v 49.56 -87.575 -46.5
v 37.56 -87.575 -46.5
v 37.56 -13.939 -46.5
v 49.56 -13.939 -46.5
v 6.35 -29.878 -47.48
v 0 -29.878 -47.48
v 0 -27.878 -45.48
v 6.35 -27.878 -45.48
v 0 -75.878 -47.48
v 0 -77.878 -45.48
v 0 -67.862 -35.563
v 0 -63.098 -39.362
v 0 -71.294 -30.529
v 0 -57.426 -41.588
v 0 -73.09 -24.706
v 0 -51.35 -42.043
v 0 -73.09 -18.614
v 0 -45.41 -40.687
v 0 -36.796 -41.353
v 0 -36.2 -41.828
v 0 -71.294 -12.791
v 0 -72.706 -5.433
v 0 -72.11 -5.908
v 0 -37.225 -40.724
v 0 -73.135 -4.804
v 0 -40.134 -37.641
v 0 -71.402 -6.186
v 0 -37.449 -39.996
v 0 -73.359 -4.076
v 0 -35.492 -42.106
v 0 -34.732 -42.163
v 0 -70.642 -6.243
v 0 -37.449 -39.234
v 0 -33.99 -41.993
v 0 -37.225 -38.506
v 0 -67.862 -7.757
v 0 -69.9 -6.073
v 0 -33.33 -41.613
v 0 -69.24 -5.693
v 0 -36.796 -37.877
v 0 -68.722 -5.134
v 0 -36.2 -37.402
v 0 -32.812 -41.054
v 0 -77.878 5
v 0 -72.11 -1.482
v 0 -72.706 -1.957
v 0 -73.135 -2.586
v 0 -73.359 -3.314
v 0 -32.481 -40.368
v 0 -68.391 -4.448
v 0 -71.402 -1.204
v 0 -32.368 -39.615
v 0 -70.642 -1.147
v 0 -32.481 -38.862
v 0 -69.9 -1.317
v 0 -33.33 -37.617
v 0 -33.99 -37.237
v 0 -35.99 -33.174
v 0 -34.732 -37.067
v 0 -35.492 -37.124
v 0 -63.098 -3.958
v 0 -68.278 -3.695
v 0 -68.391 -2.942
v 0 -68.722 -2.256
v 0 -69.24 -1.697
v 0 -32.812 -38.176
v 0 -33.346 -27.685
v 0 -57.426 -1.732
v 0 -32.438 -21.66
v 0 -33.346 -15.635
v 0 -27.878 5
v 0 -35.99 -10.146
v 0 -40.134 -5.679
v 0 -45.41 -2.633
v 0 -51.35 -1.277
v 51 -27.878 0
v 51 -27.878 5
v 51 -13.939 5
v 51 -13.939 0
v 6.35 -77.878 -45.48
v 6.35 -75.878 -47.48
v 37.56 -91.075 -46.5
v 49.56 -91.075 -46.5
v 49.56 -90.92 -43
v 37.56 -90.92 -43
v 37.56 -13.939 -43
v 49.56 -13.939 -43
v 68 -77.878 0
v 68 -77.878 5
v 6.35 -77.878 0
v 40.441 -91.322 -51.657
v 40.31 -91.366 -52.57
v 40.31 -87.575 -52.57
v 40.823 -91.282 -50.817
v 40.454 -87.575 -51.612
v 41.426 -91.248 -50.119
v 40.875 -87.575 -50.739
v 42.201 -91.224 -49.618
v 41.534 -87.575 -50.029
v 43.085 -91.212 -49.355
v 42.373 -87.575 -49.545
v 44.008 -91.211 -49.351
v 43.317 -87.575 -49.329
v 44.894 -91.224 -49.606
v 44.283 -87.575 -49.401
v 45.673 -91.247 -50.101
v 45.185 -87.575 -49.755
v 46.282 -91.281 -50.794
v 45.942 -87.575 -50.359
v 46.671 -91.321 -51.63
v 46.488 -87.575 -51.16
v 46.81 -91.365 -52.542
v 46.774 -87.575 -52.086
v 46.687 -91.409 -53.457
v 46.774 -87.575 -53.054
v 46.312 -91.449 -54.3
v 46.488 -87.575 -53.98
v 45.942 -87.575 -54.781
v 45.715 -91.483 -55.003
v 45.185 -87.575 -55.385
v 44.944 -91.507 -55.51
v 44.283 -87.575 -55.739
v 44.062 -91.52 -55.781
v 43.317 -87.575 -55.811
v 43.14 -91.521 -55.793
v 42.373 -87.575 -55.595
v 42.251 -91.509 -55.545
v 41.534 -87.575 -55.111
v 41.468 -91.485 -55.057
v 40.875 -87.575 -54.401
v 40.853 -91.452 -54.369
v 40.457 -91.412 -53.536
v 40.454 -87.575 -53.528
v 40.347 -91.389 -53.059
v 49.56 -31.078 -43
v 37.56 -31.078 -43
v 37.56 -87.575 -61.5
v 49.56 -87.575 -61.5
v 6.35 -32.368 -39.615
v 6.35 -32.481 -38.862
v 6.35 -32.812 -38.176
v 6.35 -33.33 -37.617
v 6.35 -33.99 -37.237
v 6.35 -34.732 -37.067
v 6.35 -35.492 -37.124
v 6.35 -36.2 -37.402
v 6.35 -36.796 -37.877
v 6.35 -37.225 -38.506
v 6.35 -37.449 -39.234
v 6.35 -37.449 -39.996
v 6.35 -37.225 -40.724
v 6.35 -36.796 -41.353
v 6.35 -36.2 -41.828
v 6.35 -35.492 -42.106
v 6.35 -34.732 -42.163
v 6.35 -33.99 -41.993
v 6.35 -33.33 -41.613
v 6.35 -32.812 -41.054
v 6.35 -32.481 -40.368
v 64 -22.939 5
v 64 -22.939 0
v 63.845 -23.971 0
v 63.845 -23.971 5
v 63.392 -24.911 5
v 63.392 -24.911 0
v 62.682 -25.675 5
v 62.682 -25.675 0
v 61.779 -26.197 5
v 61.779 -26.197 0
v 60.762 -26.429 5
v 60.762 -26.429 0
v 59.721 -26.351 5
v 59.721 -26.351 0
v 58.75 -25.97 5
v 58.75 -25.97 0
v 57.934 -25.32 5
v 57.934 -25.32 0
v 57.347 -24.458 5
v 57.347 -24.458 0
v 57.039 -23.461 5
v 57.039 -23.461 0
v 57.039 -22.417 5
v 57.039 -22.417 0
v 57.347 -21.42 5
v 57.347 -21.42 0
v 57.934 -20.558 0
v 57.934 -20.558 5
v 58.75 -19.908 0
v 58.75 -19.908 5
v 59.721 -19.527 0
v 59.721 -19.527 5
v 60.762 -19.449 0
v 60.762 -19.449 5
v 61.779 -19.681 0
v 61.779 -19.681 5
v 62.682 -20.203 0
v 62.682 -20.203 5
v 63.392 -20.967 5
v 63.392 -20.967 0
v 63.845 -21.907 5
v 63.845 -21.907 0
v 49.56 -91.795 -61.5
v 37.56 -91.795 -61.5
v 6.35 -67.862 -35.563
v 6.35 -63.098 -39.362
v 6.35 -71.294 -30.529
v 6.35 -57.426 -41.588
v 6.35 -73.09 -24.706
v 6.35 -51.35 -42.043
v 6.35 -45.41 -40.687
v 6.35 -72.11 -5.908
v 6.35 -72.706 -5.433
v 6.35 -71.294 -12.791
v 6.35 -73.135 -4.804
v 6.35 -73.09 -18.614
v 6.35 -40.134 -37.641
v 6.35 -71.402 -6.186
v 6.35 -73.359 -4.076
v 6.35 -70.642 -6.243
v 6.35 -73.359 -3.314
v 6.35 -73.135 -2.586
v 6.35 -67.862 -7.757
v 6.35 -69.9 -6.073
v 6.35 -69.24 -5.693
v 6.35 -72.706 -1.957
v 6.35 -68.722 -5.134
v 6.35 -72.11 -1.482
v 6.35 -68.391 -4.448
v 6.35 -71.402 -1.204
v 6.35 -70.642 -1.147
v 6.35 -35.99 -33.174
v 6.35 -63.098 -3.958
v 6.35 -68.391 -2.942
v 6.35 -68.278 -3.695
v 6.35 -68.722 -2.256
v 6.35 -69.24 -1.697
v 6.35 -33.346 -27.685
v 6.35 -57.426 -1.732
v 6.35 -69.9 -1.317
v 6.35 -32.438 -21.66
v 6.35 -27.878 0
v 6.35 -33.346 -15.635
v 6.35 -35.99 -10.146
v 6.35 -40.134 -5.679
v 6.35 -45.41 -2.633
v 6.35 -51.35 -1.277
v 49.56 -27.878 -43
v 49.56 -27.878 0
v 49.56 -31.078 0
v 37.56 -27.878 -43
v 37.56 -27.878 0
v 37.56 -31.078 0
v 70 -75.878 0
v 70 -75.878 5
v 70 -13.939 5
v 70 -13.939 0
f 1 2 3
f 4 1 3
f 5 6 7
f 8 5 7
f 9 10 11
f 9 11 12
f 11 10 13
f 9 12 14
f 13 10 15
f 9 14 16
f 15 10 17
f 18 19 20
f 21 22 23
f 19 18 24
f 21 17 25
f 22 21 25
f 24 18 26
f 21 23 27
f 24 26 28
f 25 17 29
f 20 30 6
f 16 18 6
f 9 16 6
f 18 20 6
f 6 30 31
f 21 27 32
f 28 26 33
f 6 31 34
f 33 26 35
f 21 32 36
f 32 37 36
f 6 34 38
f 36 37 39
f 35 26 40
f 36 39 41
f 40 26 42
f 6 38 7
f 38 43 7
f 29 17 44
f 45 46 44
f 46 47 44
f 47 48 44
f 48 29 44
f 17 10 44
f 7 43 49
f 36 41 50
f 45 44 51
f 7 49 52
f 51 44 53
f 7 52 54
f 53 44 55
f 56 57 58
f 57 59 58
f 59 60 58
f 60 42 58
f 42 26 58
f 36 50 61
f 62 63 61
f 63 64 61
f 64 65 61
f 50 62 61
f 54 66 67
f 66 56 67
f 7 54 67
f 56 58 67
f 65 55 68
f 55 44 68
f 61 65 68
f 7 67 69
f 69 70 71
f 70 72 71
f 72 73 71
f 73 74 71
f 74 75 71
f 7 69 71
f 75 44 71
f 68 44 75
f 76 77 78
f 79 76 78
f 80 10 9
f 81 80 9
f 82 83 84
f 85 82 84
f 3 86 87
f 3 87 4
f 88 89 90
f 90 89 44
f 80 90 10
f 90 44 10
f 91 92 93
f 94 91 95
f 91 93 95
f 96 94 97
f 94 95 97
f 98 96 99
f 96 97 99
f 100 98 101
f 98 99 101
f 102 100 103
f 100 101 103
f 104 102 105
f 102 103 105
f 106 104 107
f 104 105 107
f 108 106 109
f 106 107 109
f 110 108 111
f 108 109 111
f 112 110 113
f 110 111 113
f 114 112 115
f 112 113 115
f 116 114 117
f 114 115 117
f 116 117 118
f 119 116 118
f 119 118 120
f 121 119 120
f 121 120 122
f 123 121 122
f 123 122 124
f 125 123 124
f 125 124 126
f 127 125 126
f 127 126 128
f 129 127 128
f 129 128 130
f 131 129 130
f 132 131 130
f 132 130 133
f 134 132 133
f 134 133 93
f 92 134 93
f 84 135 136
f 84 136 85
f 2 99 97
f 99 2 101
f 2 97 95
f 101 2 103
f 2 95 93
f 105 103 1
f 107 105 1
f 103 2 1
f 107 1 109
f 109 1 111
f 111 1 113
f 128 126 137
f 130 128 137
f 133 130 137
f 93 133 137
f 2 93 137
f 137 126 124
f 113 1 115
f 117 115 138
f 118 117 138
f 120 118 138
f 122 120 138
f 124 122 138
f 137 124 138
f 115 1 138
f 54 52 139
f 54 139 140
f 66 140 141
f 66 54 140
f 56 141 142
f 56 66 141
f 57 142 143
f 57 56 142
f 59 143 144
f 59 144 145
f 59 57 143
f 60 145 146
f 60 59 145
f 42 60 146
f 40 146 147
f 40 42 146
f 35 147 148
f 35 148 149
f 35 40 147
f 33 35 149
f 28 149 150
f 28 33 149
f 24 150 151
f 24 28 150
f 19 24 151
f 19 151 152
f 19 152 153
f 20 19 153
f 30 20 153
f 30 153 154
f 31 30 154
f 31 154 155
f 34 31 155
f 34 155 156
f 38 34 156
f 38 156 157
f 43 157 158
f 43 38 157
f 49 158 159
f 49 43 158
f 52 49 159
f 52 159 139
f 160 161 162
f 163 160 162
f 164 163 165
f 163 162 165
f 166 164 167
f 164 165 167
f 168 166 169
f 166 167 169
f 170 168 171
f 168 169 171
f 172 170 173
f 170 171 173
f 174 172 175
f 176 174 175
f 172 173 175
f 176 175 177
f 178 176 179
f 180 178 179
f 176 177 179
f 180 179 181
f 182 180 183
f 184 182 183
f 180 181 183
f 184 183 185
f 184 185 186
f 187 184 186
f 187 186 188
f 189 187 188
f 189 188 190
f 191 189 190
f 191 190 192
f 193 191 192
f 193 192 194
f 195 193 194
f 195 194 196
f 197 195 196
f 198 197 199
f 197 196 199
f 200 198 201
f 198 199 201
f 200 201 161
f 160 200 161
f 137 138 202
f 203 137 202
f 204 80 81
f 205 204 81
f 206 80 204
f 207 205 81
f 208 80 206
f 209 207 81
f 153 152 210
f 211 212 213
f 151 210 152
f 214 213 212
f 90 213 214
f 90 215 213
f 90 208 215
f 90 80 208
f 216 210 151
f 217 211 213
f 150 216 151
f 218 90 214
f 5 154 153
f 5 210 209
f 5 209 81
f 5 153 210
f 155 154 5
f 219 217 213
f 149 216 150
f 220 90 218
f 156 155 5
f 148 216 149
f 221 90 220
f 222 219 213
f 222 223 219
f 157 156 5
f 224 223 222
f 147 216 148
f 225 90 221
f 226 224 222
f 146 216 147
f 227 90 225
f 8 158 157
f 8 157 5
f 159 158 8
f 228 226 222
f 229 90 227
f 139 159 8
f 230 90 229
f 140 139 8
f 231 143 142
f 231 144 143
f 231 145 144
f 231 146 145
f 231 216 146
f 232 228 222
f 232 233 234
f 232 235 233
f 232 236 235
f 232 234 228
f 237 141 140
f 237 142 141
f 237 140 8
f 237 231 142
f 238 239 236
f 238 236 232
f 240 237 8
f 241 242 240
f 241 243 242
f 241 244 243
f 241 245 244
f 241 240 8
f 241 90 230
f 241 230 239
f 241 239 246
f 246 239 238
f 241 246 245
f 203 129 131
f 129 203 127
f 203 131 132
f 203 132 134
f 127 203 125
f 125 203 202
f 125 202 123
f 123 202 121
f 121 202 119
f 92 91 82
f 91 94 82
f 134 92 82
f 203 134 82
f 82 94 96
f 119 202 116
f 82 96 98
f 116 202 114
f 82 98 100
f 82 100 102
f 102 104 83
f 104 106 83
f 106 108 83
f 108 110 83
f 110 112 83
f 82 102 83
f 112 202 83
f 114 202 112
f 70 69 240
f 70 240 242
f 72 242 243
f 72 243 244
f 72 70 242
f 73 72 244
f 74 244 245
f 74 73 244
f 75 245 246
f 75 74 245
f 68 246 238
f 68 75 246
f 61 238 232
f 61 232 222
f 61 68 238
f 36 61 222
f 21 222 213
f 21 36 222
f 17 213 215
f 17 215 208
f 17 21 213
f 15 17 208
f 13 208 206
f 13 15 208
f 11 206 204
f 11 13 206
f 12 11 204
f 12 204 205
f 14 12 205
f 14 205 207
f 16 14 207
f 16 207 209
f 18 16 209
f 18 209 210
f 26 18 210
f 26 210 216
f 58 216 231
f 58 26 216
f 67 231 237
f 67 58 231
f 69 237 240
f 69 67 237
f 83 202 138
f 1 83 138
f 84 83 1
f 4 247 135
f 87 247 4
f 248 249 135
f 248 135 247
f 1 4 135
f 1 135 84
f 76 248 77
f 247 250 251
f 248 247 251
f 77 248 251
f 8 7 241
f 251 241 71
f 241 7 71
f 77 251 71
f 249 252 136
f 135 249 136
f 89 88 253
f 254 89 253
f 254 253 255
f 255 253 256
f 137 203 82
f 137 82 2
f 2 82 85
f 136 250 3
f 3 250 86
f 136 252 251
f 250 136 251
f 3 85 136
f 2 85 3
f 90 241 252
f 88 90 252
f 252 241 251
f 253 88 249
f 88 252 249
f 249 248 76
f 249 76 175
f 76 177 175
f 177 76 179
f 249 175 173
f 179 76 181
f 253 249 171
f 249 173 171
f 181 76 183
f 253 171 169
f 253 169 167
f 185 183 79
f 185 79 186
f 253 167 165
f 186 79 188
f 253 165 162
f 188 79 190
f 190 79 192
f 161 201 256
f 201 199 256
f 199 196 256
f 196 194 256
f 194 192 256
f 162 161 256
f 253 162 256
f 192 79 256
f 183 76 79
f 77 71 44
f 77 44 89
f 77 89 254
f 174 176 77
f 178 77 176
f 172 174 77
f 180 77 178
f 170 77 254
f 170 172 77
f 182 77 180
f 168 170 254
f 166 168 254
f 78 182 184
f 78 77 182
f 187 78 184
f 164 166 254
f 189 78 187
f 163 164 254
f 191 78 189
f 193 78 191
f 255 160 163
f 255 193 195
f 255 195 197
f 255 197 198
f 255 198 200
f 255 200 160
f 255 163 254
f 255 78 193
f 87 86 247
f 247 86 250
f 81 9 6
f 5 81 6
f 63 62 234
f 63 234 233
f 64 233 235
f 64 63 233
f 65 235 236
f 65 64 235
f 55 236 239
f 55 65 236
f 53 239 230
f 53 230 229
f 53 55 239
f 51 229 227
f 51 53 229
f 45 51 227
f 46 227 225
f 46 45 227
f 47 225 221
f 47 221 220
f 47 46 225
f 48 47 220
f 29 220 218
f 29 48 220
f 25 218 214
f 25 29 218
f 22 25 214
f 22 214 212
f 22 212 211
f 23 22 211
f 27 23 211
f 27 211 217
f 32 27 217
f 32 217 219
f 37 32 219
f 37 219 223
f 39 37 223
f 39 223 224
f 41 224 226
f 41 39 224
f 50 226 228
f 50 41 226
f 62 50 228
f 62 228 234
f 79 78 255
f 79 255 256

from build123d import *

# Parameters (mm, degrees)
BOSS_EXTRUDE1_DEPTH   = 5
SKETCH2_W             = 6.35
SKETCH2_H             = 50
BOSS_EXTRUDE2_DEPTH   = 52.48
CUT_EXTRUDE1_REACH    = 106.448
SKETCH3_R             = 20.44
SKETCH3_R_2           = 2.555
SKETCH3_W             = 5
SKETCH3_H             = 50
CUT_EXTRUDE2_REACH    = 108.104
SKETCH4_R             = 3.5
CUT_EXTRUDE6_REACH    = 108.104
SKETCH14_W            = 23.196263878
SKETCH14_H            = 15.316152196
SKETCH15_W            = 12
SKETCH15_H            = 3.2
BOSS_EXTRUDE7_DEPTH   = 46.5
BOSS_EXTRUDE8_REACH   = 98.667
SKETCH16_W            = 12
SKETCH16_H            = 3.5
SKETCH17_W            = 12
SKETCH17_H            = 3.5
BOSS_EXTRUDE9_DEPTH   = 15
CHAMFER2_SIZE         = 2
SKETCH22_W            = 12
SKETCH22_H            = 15
BOSS_EXTRUDE10_DEPTH  = 0.72
CUT_EXTRUDE8_REACH    = 103.606
CUT_EXTRUDE7_REACH    = 120.762
SKETCH18_R            = 3.25
MIRROR2_OUTLINE_W     = 50
MIRROR2_OUTLINE_H     = 5
MIRROR2_DEPTH         = 68
MIRROR2_2_OUTLINE_R   = 2.555
MIRROR2_2_OUTLINE_R_2 = 20.44
MIRROR2_2_DEPTH       = 6.35
MIRROR2_START         = 37.56
MIRROR2_3_DEPTH       = 12
MIRROR2_START_2       = 51
MIRROR2_4_OUTLINE_W   = 13.938985111
MIRROR2_4_OUTLINE_H   = 5
MIRROR2_4_DEPTH       = 5.9999999
MIRROR2_START_3       = 64.0000001
MIRROR2_5_OUTLINE_W   = 13.938985111
MIRROR2_5_OUTLINE_H   = 5
MIRROR2_5_DEPTH       = 5.9999999
MIRROR2_6_DEPTH       = 5
BOSS_EXTRUDE11_DEPTH  = 12
CUT_EXTRUDE9_REACH    = 132.799
SKETCH26_W            = 121.241742099
SKETCH26_H            = 103.992632166
SKETCH27_R            = 3.25
CUT_EXTRUDE10_DEPTH   = 119.762181294


with BuildPart() as part:
    # Sketch1 → Boss-Extrude1 (new body)
    with BuildSketch(Plane.XY):
        Polygon((0, 0), (0, 50), (51, 50), (51, 64.061014889), (70, 64.061014889), (70, -13.938985111), (51, -13.938985111), (51, 0), align=None)
    extrude(amount=BOSS_EXTRUDE1_DEPTH)

    # Sketch2 → Boss-Extrude2 (add)
    with BuildSketch(Plane(origin=(0, 0, 0), x_dir=(-1, 0, 0), z_dir=(0, 0, -1))):
        with Locations((-3.175, 25)):
            Rectangle(SKETCH2_W, SKETCH2_H)
    extrude(amount=BOSS_EXTRUDE2_DEPTH)

    # Sketch3 → Cut-Extrude1 (cut, up to next)
    with BuildSketch(Plane(origin=(6.35, 0, 0), x_dir=(0, 0, -1), z_dir=(1, 0, 0)), mode=Mode.PRIVATE) as cut_extrude1_sk1:
        with Locations((21.66, 25)):
            Circle(SKETCH3_R)
    cut_extrude1_tool1 = extrude(cut_extrude1_sk1.sketch, amount=-CUT_EXTRUDE1_REACH, mode=Mode.PRIVATE) & part.part
    # Sketch3 → Cut-Extrude1 (cut, up to next)
    with BuildSketch(Plane(origin=(6.35, 0, 0), x_dir=(0, 0, -1), z_dir=(1, 0, 0)), mode=Mode.PRIVATE) as cut_extrude1_sk2:
        with Locations((3.695, 42.955)):
            Circle(SKETCH3_R_2)
    cut_extrude1_tool2 = extrude(cut_extrude1_sk2.sketch, amount=-CUT_EXTRUDE1_REACH, mode=Mode.PRIVATE) & part.part
    # Sketch3 → Cut-Extrude1 (cut, up to next)
    with BuildSketch(Plane(origin=(6.35, 0, 0), x_dir=(0, 0, -1), z_dir=(1, 0, 0)), mode=Mode.PRIVATE) as cut_extrude1_sk3:
        with Locations((39.615, 7.045)):
            Circle(SKETCH3_R_2)
    cut_extrude1_tool3 = extrude(cut_extrude1_sk3.sketch, amount=-CUT_EXTRUDE1_REACH, mode=Mode.PRIVATE) & part.part
    # Sketch3 → Cut-Extrude1 (cut, up to next)
    with BuildSketch(Plane(origin=(6.35, 0, 0), x_dir=(0, 0, -1), z_dir=(1, 0, 0)), mode=Mode.PRIVATE) as cut_extrude1_sk4:
        with Locations((49.98, 25)):
            Rectangle(SKETCH3_W, SKETCH3_H)
    cut_extrude1_tool4 = extrude(cut_extrude1_sk4.sketch, amount=-CUT_EXTRUDE1_REACH, mode=Mode.PRIVATE) & part.part
    add(cut_extrude1_tool1.solids().sort_by_distance((6.35, 25, -21.66))[0], mode=Mode.SUBTRACT)
    add(cut_extrude1_tool2.solids().sort_by_distance((6.35, 42.955, -3.695))[0], mode=Mode.SUBTRACT)
    add(cut_extrude1_tool3.solids().sort_by_distance((6.35, 7.045, -39.615))[0], mode=Mode.SUBTRACT)
    add(cut_extrude1_tool4.solids().sort_by_distance((6.35, 25, -49.98))[0], mode=Mode.SUBTRACT)

    # Sketch4 → Cut-Extrude2 (cut, up to next)
    with BuildSketch(Plane(origin=(0, 0, 0), x_dir=(-1, 0, 0), z_dir=(0, 0, -1)), mode=Mode.PRIVATE) as cut_extrude2_sk1:
        with Locations((-60.5, 55.061014889)):
            Circle(SKETCH4_R)
    cut_extrude2_tool1 = extrude(cut_extrude2_sk1.sketch, amount=-CUT_EXTRUDE2_REACH, mode=Mode.PRIVATE) & part.part
    # Sketch4 → Cut-Extrude2 (cut, up to next)
    with BuildSketch(Plane(origin=(0, 0, 0), x_dir=(-1, 0, 0), z_dir=(0, 0, -1)), mode=Mode.PRIVATE) as cut_extrude2_sk2:
        with Locations((-60.5, -4.938985111)):
            Circle(SKETCH4_R)
    cut_extrude2_tool2 = extrude(cut_extrude2_sk2.sketch, amount=-CUT_EXTRUDE2_REACH, mode=Mode.PRIVATE) & part.part
    add(cut_extrude2_tool1.solids().sort_by_distance((60.5, 55.061015, 0))[0], mode=Mode.SUBTRACT)
    add(cut_extrude2_tool2.solids().sort_by_distance((60.5, -4.938985, 0))[0], mode=Mode.SUBTRACT)

    # Sketch14 → Cut-Extrude6 (cut, up to next)
    with BuildSketch(Plane(origin=(0, 0, 0), x_dir=(-1, 0, 0), z_dir=(0, 0, -1)), mode=Mode.PRIVATE) as cut_extrude6_sk1:
        with Locations((-62.598131939, 57.658076098)):
            Rectangle(SKETCH14_W, SKETCH14_H)
    cut_extrude6_tool1 = extrude(cut_extrude6_sk1.sketch, amount=-CUT_EXTRUDE6_REACH, mode=Mode.PRIVATE) & part.part
    add(cut_extrude6_tool1.solids().sort_by_distance((62.598132, 57.658076, 0))[0], mode=Mode.SUBTRACT)

    # Sketch15 → Boss-Extrude7 (add)
    with BuildSketch(Plane(origin=(0, 0, 0), x_dir=(-1, 0, 0), z_dir=(0, 0, -1))):
        with Locations((-43.56, 1.6)):
            Rectangle(SKETCH15_W, SKETCH15_H)
    extrude(amount=BOSS_EXTRUDE7_DEPTH)

    # Boss-Extrude8: up to this plane
    boss_extrude8_end = Plane(origin=(166.832994776, 64.085435133, -66.619565524), z_dir=(-1.1416993347548052e-15, 0.9990256874715413, 0.04413247978546202))
    # Sketch16 → Boss-Extrude8 (add, up to the surface)
    with BuildSketch(Plane(origin=(0, 3.2, 0), x_dir=(1, 0, 0), z_dir=(0, 1, 0)), mode=Mode.PRIVATE) as boss_extrude8_sk1:
        with Locations((43.56, 44.75)):
            Rectangle(SKETCH16_W, SKETCH16_H)
    boss_extrude8_tool1 = split(extrude(boss_extrude8_sk1.sketch, amount=BOSS_EXTRUDE8_REACH, mode=Mode.PRIVATE), bisect_by=boss_extrude8_end, keep=Keep.BOTH, mode=Mode.PRIVATE)
    add(boss_extrude8_tool1.solids().sort_by_distance((43.56, 3.2, -44.75))[0])

    # Sketch17 → Boss-Extrude9 (add)
    with BuildSketch(Plane(origin=(0, 0, -46.5), x_dir=(-1, 0, 0), z_dir=(0, 0, -1))):
        with Locations((-43.56, 61.446642853)):
            Rectangle(SKETCH17_W, SKETCH17_H)
    extrude(amount=BOSS_EXTRUDE9_DEPTH)

    # Chamfer2
    chamfer2_edges = [part.edges().sort_by_distance(p)[0] for p in [
        (3.175, 0, -47.48),
        (3.175, 50, -47.48),
        (70, 50, 2.5),
    ]]
    chamfer(chamfer2_edges, length=CHAMFER2_SIZE)

    # Sketch22 → Boss-Extrude10 (add)
    with BuildSketch(Plane(origin=(0, 63.196642853, 0), x_dir=(1, 0, 0), z_dir=(0, 1, 0))):
        with Locations((43.56, 54)):
            Rectangle(SKETCH22_W, SKETCH22_H)
    extrude(amount=BOSS_EXTRUDE10_DEPTH)

    # Sketch23 → Cut-Extrude8 (cut, up to next)
    with BuildSketch(Plane(origin=(49.56, 0, 0), x_dir=(0, 0, -1), z_dir=(1, 0, 0)), mode=Mode.PRIVATE) as cut_extrude8_sk1:
        Polygon((46.5, 63.916642853), (46.5, 63.196642853), (61.5, 63.916642853), align=None)
    cut_extrude8_tool1 = extrude(cut_extrude8_sk1.sketch, amount=-CUT_EXTRUDE8_REACH, mode=Mode.PRIVATE) & part.part
    add(cut_extrude8_tool1.solids().sort_by_distance((49.56, 63.676643, -51.5))[0], mode=Mode.SUBTRACT)

    # Cut-Extrude7: up to this plane
    cut_extrude7_end = Plane(origin=(-0.001, 63.196642853, -46.5), z_dir=(-2.1659106514416256e-15, -0.9988499868416298, -0.04794479936839813))
    # Sketch18 → Cut-Extrude7 (cut, up to the surface)
    with BuildSketch(Plane.XZ.offset(-59.696642853), mode=Mode.PRIVATE) as cut_extrude7_sk1:
        with Locations(Location((43.56, -52.57, 0), (0, 0, 270))):
            Circle(SKETCH18_R)
    cut_extrude7_tool1 = split(extrude(cut_extrude7_sk1.sketch, amount=-CUT_EXTRUDE7_REACH, mode=Mode.PRIVATE), bisect_by=cut_extrude7_end, keep=Keep.BOTH, mode=Mode.PRIVATE)
    add(cut_extrude7_tool1.solids().sort_by_distance((43.56, 59.696643, -52.57))[0], mode=Mode.SUBTRACT)



with BuildPart() as body_2:
    # Mirror2: read off the stored shape, not the designer's step
    # Mirror2 outline → Mirror2 (new body)
    with BuildSketch(Plane.YZ):
        with Locations((-52.877970222, 2.5)):
            Rectangle(MIRROR2_OUTLINE_W, MIRROR2_OUTLINE_H)
    extrude(amount=MIRROR2_DEPTH)

    # Mirror2 2 outline → Mirror2 2 (add)
    with BuildSketch(Plane.YZ):
        Polygon((-27.877970222, -45.48), (-27.877970222, 0), (-77.877970222, 0), (-77.877970222, -45.48), (-75.877970222, -47.48), (-29.877970222, -47.48), align=None)
        with Locations((-34.922970222, -39.615)):
            Circle(MIRROR2_2_OUTLINE_R, mode=Mode.SUBTRACT)
        with Locations((-70.832970222, -3.695)):
            Circle(MIRROR2_2_OUTLINE_R, mode=Mode.SUBTRACT)
        with Locations((-52.877970222, -21.66)):
            Circle(MIRROR2_2_OUTLINE_R_2, mode=Mode.SUBTRACT)
    extrude(amount=MIRROR2_2_DEPTH)


with BuildPart() as part_1:
    add(part.part)

    add(body_2.part)  # Mirror2 3 merges body 2
    # Mirror2 3 outline → Mirror2 3 (add)
    with BuildSketch(Plane.YZ.offset(MIRROR2_START)):
        Polygon((-31.077970222, -46.5), (0, -46.5), (0, -43), (-27.877970222, -43), (-27.877970222, 0), (-31.077970222, 0), align=None)
    extrude(amount=MIRROR2_3_DEPTH)

    # Mirror2 4 outline → Mirror2 4 (add)
    with BuildSketch(Plane.YZ.offset(MIRROR2_START_2)):
        with Locations((-20.908477667, 2.5)):
            Rectangle(MIRROR2_4_OUTLINE_W, MIRROR2_4_OUTLINE_H)
    extrude(amount=MIRROR2_4_DEPTH)

    # Mirror2 5 outline → Mirror2 5 (add)
    with BuildSketch(Plane.YZ.offset(MIRROR2_START_3)):
        with Locations((-20.908477667, 2.5)):
            Rectangle(MIRROR2_5_OUTLINE_W, MIRROR2_5_OUTLINE_H)
    extrude(amount=MIRROR2_5_DEPTH)

    # Mirror2 6 outline → Mirror2 6 (add)
    with BuildSketch(Plane.XY):
        Polygon((70, -75.877970222), (70, -27.877970222), (68, -27.877970222), (68, -77.877970222), align=None)
        with BuildLine():
            Line((64.0000001, -27.877970222), (64, -22.938985111))
            ThreePointArc((64, -22.938985111), (60.5, -26.438985111), (57, -22.938985111))
            Line((57, -22.938985111), (56.9999999, -27.877970222))
            Line((56.9999999, -27.877970222), (64.0000001, -27.877970222))
        make_face()
        with BuildLine():
            ThreePointArc((57, -22.938985111), (60.5, -19.438985111), (64, -22.938985111))
            Line((64, -22.938985111), (64.0000001, -13.938985111))
            Line((64.0000001, -13.938985111), (56.9999999, -13.938985111))
            Line((56.9999999, -13.938985111), (57, -22.938985111))
        make_face()
    extrude(amount=MIRROR2_6_DEPTH)

    # Sketch25 → Boss-Extrude11 (add)
    with BuildSketch(Plane(origin=(49.56, 0, 0), x_dir=(0, 0, -1), z_dir=(1, 0, 0))):
        Polygon((43, -13.938985111), (46.5, -13.938985111), (46.5, -87.574613075), (61.5, -87.574613075), (61.5, -91.794613075), (46.5, -91.074613075), (43, -90.919998753), (43, -31.077970222), align=None)
    extrude(amount=-BOSS_EXTRUDE11_DEPTH)

    # Cut-Extrude9: up to this face of the body (flat: up to its plane)
    cut_extrude9_end = Plane(part_1.part.faces().sort_by_distance((0, 0.724855186, -20.24))[0])
    # Sketch26 → Cut-Extrude9 (cut, up to the picked face)
    with BuildSketch(Plane(origin=(70, 0, 0), x_dir=(0, 0, -1), z_dir=(1, 0, 0)), mode=Mode.PRIVATE) as cut_extrude9_sk1:
        with Locations((55.62087105, 38.057330972)):
            Rectangle(SKETCH26_W, SKETCH26_H)
    cut_extrude9_tool1 = split(extrude(cut_extrude9_sk1.sketch, amount=-CUT_EXTRUDE9_REACH, mode=Mode.PRIVATE), bisect_by=cut_extrude9_end, keep=Keep.BOTH, mode=Mode.PRIVATE)
    add(cut_extrude9_tool1.solids().sort_by(Axis((70, 38.057331, -55.620871), (-1, 0, 0)))[0], mode=Mode.SUBTRACT)

    # Sketch27 → Cut-Extrude10 (cut, through all)
    with BuildSketch(Plane(origin=(0, -87.574613075, 0), x_dir=(1, 0, 0), z_dir=(0, 1, 0))):
        with Locations(Location((43.56, 52.57, 0), (0, 0, 180))):
            Circle(SKETCH27_R)
    extrude(amount=-CUT_EXTRUDE10_DEPTH, mode=Mode.SUBTRACT)


solid = part_1.part
